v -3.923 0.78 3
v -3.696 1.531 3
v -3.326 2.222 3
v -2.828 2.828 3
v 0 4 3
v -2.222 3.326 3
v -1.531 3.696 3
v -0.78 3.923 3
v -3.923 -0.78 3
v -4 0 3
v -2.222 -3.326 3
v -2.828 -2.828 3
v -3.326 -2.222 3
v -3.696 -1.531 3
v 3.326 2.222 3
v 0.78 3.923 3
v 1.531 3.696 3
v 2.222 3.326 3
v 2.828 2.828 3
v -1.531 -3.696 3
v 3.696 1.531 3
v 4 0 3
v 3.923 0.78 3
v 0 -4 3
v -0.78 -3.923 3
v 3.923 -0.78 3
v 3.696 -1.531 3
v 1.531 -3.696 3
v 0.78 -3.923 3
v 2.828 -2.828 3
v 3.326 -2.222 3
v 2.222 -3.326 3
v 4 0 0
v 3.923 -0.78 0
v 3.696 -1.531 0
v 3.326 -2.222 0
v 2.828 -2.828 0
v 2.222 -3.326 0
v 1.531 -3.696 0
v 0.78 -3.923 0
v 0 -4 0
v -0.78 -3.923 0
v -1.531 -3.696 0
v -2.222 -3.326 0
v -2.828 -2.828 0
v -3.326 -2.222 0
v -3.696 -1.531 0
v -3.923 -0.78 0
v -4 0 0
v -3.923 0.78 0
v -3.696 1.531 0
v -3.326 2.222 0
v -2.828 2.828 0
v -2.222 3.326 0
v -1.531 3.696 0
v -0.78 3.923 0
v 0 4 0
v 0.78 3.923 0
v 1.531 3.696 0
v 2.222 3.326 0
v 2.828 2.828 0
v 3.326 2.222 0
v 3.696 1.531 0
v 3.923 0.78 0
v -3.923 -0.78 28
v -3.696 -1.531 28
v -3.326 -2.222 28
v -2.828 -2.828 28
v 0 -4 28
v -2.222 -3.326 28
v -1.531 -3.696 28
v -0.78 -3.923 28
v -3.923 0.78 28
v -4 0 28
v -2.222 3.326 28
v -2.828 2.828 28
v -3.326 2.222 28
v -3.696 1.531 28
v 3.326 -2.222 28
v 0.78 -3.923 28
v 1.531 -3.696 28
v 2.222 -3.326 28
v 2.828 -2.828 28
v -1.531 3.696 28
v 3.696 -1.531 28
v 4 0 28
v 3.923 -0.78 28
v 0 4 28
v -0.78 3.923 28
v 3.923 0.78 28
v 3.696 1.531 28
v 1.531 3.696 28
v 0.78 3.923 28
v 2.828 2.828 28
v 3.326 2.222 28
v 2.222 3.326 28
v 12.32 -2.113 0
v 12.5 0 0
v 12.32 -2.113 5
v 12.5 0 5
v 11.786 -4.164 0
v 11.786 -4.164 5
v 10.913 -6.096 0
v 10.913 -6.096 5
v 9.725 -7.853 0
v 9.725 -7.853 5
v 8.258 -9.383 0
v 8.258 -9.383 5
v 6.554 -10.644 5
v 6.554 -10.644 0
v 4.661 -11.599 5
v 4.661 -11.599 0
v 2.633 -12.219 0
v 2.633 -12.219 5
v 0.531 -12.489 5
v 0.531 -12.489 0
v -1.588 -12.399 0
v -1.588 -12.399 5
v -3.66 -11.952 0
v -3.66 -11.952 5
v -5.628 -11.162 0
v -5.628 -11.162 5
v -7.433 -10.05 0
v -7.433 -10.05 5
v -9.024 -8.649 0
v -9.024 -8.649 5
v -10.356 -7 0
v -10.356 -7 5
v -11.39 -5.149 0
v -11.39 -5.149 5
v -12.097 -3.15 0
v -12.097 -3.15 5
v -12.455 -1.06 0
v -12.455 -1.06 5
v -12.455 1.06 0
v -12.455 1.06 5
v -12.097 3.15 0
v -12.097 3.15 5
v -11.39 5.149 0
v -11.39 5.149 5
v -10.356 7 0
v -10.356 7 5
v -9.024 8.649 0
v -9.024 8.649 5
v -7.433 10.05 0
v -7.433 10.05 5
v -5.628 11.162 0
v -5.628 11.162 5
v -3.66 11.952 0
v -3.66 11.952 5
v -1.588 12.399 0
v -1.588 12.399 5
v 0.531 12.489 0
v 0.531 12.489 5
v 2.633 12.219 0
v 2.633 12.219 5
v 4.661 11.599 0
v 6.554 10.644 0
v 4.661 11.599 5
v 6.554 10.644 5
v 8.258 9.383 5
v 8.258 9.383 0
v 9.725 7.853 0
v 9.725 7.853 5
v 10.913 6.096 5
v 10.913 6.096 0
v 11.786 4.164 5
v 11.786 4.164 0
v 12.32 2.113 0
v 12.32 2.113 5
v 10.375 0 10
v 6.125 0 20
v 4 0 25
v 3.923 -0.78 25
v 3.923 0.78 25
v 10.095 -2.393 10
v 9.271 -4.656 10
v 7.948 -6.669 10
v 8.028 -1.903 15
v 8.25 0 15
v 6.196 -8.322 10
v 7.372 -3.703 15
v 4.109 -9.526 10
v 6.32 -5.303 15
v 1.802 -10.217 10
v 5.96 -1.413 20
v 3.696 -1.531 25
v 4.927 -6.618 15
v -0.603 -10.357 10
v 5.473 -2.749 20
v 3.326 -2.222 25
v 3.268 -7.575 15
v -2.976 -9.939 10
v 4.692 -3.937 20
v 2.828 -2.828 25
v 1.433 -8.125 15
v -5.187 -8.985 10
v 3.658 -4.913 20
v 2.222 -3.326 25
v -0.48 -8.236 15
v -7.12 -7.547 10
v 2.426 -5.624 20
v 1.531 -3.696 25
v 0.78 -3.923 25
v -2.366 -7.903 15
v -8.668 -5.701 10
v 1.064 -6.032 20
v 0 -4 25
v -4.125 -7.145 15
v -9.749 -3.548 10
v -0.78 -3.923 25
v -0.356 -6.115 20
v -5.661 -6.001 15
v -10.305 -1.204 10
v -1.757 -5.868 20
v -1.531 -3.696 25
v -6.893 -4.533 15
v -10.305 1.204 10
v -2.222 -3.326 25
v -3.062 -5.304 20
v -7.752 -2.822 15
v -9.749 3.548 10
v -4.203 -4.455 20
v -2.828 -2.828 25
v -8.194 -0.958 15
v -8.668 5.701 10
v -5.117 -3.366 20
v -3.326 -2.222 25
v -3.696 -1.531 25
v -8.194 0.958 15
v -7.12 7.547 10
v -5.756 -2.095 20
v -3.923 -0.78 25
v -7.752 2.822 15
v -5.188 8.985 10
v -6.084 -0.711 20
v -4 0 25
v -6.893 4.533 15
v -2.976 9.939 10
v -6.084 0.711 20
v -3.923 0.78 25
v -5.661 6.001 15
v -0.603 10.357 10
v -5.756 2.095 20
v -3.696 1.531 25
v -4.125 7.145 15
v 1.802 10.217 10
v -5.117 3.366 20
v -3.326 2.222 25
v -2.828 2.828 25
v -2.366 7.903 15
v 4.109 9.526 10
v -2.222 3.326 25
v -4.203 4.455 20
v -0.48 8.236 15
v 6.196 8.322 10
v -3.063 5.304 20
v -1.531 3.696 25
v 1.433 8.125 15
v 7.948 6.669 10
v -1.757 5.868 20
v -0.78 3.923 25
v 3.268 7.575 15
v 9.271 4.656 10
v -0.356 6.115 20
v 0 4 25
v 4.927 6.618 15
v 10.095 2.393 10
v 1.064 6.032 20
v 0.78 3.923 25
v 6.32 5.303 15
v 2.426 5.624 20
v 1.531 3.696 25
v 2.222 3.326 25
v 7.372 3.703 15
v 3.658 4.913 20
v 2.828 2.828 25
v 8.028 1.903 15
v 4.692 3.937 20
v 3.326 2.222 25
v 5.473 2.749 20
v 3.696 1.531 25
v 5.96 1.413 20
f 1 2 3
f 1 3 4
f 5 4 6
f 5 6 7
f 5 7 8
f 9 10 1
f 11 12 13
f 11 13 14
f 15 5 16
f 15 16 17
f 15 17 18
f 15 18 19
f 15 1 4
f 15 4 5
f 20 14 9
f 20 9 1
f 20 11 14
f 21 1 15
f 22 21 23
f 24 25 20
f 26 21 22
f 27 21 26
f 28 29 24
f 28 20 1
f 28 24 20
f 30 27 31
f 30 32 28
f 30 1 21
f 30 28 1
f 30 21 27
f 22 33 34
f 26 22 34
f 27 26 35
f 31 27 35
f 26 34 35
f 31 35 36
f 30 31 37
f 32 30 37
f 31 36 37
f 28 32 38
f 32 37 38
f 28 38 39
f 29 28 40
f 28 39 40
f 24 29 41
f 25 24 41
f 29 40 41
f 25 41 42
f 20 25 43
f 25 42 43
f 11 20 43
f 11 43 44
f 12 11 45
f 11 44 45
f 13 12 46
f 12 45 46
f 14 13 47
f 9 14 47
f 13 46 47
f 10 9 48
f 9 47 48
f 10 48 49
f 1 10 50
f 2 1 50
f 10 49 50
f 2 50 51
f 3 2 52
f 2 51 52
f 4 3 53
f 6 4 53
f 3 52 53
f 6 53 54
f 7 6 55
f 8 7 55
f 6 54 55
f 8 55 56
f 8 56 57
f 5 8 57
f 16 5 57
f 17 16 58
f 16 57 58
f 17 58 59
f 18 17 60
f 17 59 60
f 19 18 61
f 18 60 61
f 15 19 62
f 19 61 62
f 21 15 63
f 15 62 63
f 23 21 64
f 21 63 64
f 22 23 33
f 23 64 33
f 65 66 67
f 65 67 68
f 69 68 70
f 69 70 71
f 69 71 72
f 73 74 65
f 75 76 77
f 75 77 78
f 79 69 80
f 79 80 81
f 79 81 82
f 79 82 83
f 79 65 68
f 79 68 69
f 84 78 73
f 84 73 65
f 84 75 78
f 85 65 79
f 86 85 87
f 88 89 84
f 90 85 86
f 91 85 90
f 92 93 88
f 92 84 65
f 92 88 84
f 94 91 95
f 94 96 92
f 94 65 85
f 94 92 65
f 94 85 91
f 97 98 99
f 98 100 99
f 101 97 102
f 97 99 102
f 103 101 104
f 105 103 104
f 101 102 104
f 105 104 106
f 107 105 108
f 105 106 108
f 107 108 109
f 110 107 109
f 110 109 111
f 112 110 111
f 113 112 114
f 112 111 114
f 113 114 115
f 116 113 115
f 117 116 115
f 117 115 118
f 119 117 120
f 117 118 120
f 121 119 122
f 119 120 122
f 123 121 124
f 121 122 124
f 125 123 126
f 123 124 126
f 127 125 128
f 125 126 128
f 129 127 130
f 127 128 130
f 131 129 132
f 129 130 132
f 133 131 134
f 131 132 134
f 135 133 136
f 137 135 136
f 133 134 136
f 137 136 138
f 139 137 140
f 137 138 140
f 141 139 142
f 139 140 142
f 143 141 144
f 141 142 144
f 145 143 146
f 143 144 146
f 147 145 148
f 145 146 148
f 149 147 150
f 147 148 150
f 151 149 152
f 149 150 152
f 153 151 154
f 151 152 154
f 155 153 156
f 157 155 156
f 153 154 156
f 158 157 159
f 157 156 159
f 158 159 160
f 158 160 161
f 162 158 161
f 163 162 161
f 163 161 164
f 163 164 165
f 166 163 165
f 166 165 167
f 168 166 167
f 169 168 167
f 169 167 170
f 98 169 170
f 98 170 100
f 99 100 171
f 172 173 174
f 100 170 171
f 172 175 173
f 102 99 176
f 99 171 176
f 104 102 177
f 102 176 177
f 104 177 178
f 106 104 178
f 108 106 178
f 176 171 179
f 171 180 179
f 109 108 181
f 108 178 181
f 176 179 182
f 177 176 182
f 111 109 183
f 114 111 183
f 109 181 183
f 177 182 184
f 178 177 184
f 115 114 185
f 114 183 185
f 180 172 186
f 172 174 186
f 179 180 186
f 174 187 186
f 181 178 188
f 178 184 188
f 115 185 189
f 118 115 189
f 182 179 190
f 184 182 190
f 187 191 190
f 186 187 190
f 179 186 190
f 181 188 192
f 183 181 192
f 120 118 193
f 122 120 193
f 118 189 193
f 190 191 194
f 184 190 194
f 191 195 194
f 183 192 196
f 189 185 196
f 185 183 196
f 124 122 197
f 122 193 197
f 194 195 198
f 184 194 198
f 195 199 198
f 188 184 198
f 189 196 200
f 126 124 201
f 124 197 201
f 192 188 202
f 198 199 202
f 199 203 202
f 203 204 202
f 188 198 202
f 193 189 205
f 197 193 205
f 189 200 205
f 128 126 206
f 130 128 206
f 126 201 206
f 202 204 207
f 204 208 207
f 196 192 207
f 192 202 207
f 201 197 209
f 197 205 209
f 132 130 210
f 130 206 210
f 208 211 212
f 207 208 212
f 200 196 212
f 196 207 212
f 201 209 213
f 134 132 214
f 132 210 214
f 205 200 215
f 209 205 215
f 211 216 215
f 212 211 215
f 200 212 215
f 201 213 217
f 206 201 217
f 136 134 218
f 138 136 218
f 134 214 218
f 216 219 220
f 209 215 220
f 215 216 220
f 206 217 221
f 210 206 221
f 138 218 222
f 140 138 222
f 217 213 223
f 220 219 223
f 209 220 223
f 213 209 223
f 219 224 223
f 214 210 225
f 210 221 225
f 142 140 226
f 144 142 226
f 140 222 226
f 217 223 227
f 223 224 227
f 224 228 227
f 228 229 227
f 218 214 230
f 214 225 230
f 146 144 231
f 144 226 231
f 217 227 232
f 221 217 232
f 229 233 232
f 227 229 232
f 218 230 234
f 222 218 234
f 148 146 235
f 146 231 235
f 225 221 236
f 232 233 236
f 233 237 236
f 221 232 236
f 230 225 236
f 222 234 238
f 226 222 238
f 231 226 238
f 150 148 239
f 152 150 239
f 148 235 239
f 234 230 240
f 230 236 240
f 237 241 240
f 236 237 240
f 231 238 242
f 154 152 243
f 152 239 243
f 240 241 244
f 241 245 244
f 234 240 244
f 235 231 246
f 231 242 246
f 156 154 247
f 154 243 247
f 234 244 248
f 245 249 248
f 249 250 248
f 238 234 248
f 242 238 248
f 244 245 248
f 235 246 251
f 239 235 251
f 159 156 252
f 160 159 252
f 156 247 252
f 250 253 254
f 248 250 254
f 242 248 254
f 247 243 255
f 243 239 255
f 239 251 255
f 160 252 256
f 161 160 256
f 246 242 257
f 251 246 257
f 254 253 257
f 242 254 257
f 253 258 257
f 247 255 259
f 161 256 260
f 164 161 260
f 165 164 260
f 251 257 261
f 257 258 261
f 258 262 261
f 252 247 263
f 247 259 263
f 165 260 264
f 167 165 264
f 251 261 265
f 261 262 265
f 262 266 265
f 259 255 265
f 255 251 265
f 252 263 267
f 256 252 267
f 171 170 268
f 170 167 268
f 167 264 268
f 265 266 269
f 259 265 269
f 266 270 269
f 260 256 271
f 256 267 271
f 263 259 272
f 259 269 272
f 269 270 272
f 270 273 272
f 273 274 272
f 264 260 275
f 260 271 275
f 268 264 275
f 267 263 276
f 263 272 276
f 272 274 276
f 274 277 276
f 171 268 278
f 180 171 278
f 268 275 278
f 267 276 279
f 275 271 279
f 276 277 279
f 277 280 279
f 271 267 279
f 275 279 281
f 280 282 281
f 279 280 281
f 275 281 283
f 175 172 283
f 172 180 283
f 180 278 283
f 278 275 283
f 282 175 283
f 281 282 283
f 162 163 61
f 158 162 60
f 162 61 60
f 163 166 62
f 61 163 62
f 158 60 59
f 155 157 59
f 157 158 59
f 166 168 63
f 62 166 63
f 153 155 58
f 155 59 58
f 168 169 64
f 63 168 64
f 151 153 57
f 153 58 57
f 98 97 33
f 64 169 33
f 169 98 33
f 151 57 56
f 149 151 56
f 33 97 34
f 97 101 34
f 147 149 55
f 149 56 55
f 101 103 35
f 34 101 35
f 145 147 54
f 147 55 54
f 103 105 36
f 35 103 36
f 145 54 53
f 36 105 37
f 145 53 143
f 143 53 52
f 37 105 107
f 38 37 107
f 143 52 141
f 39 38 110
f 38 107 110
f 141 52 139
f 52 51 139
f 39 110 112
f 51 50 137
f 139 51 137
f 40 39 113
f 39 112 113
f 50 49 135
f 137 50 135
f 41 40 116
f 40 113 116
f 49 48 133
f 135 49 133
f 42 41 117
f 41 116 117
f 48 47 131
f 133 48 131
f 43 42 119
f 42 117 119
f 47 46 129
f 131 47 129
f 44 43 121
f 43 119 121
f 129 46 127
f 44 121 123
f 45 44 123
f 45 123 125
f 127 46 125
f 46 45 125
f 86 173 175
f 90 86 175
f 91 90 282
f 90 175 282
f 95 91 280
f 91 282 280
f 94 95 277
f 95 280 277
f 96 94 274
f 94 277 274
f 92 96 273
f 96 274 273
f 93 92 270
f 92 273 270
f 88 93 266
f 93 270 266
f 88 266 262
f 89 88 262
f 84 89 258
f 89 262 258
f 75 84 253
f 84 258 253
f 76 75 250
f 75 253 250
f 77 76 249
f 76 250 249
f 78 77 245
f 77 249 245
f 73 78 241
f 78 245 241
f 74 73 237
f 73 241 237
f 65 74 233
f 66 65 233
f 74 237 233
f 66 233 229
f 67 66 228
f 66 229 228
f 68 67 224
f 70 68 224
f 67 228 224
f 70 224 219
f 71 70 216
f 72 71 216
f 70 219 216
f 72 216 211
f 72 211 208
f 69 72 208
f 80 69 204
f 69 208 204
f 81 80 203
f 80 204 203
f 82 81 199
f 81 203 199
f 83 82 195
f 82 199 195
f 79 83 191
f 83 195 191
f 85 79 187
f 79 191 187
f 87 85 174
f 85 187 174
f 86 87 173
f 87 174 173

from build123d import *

# Parameters (mm, degrees)
F2_R     = 4
F3_DEPTH = 3
F4_R     = 4
F5_DEPTH = 3


with BuildPart() as f1:
    # F0 (on Front) → F1 (revolve)
    with BuildSketch(Plane.XZ):
        Polygon((0, 25), (0, 0), (12.5, 0), (12.5, 5), (4, 25), align=None)
    revolve(axis=Axis((0, 0, 12.5), (0, 0, -1)))

    # F2 (on face) → F3 (join)
    with BuildSketch(Plane.XY.offset(25)):
        Circle(F2_R)
    extrude(amount=F3_DEPTH)

    # F4 (on face) → F5 (cut)
    with BuildSketch(Plane(origin=(0, 0, 0), x_dir=(1, 0, 0), z_dir=(0, 0, -1))):
        Circle(F4_R)
    extrude(amount=-F5_DEPTH, mode=Mode.SUBTRACT)


solid = f1.part
